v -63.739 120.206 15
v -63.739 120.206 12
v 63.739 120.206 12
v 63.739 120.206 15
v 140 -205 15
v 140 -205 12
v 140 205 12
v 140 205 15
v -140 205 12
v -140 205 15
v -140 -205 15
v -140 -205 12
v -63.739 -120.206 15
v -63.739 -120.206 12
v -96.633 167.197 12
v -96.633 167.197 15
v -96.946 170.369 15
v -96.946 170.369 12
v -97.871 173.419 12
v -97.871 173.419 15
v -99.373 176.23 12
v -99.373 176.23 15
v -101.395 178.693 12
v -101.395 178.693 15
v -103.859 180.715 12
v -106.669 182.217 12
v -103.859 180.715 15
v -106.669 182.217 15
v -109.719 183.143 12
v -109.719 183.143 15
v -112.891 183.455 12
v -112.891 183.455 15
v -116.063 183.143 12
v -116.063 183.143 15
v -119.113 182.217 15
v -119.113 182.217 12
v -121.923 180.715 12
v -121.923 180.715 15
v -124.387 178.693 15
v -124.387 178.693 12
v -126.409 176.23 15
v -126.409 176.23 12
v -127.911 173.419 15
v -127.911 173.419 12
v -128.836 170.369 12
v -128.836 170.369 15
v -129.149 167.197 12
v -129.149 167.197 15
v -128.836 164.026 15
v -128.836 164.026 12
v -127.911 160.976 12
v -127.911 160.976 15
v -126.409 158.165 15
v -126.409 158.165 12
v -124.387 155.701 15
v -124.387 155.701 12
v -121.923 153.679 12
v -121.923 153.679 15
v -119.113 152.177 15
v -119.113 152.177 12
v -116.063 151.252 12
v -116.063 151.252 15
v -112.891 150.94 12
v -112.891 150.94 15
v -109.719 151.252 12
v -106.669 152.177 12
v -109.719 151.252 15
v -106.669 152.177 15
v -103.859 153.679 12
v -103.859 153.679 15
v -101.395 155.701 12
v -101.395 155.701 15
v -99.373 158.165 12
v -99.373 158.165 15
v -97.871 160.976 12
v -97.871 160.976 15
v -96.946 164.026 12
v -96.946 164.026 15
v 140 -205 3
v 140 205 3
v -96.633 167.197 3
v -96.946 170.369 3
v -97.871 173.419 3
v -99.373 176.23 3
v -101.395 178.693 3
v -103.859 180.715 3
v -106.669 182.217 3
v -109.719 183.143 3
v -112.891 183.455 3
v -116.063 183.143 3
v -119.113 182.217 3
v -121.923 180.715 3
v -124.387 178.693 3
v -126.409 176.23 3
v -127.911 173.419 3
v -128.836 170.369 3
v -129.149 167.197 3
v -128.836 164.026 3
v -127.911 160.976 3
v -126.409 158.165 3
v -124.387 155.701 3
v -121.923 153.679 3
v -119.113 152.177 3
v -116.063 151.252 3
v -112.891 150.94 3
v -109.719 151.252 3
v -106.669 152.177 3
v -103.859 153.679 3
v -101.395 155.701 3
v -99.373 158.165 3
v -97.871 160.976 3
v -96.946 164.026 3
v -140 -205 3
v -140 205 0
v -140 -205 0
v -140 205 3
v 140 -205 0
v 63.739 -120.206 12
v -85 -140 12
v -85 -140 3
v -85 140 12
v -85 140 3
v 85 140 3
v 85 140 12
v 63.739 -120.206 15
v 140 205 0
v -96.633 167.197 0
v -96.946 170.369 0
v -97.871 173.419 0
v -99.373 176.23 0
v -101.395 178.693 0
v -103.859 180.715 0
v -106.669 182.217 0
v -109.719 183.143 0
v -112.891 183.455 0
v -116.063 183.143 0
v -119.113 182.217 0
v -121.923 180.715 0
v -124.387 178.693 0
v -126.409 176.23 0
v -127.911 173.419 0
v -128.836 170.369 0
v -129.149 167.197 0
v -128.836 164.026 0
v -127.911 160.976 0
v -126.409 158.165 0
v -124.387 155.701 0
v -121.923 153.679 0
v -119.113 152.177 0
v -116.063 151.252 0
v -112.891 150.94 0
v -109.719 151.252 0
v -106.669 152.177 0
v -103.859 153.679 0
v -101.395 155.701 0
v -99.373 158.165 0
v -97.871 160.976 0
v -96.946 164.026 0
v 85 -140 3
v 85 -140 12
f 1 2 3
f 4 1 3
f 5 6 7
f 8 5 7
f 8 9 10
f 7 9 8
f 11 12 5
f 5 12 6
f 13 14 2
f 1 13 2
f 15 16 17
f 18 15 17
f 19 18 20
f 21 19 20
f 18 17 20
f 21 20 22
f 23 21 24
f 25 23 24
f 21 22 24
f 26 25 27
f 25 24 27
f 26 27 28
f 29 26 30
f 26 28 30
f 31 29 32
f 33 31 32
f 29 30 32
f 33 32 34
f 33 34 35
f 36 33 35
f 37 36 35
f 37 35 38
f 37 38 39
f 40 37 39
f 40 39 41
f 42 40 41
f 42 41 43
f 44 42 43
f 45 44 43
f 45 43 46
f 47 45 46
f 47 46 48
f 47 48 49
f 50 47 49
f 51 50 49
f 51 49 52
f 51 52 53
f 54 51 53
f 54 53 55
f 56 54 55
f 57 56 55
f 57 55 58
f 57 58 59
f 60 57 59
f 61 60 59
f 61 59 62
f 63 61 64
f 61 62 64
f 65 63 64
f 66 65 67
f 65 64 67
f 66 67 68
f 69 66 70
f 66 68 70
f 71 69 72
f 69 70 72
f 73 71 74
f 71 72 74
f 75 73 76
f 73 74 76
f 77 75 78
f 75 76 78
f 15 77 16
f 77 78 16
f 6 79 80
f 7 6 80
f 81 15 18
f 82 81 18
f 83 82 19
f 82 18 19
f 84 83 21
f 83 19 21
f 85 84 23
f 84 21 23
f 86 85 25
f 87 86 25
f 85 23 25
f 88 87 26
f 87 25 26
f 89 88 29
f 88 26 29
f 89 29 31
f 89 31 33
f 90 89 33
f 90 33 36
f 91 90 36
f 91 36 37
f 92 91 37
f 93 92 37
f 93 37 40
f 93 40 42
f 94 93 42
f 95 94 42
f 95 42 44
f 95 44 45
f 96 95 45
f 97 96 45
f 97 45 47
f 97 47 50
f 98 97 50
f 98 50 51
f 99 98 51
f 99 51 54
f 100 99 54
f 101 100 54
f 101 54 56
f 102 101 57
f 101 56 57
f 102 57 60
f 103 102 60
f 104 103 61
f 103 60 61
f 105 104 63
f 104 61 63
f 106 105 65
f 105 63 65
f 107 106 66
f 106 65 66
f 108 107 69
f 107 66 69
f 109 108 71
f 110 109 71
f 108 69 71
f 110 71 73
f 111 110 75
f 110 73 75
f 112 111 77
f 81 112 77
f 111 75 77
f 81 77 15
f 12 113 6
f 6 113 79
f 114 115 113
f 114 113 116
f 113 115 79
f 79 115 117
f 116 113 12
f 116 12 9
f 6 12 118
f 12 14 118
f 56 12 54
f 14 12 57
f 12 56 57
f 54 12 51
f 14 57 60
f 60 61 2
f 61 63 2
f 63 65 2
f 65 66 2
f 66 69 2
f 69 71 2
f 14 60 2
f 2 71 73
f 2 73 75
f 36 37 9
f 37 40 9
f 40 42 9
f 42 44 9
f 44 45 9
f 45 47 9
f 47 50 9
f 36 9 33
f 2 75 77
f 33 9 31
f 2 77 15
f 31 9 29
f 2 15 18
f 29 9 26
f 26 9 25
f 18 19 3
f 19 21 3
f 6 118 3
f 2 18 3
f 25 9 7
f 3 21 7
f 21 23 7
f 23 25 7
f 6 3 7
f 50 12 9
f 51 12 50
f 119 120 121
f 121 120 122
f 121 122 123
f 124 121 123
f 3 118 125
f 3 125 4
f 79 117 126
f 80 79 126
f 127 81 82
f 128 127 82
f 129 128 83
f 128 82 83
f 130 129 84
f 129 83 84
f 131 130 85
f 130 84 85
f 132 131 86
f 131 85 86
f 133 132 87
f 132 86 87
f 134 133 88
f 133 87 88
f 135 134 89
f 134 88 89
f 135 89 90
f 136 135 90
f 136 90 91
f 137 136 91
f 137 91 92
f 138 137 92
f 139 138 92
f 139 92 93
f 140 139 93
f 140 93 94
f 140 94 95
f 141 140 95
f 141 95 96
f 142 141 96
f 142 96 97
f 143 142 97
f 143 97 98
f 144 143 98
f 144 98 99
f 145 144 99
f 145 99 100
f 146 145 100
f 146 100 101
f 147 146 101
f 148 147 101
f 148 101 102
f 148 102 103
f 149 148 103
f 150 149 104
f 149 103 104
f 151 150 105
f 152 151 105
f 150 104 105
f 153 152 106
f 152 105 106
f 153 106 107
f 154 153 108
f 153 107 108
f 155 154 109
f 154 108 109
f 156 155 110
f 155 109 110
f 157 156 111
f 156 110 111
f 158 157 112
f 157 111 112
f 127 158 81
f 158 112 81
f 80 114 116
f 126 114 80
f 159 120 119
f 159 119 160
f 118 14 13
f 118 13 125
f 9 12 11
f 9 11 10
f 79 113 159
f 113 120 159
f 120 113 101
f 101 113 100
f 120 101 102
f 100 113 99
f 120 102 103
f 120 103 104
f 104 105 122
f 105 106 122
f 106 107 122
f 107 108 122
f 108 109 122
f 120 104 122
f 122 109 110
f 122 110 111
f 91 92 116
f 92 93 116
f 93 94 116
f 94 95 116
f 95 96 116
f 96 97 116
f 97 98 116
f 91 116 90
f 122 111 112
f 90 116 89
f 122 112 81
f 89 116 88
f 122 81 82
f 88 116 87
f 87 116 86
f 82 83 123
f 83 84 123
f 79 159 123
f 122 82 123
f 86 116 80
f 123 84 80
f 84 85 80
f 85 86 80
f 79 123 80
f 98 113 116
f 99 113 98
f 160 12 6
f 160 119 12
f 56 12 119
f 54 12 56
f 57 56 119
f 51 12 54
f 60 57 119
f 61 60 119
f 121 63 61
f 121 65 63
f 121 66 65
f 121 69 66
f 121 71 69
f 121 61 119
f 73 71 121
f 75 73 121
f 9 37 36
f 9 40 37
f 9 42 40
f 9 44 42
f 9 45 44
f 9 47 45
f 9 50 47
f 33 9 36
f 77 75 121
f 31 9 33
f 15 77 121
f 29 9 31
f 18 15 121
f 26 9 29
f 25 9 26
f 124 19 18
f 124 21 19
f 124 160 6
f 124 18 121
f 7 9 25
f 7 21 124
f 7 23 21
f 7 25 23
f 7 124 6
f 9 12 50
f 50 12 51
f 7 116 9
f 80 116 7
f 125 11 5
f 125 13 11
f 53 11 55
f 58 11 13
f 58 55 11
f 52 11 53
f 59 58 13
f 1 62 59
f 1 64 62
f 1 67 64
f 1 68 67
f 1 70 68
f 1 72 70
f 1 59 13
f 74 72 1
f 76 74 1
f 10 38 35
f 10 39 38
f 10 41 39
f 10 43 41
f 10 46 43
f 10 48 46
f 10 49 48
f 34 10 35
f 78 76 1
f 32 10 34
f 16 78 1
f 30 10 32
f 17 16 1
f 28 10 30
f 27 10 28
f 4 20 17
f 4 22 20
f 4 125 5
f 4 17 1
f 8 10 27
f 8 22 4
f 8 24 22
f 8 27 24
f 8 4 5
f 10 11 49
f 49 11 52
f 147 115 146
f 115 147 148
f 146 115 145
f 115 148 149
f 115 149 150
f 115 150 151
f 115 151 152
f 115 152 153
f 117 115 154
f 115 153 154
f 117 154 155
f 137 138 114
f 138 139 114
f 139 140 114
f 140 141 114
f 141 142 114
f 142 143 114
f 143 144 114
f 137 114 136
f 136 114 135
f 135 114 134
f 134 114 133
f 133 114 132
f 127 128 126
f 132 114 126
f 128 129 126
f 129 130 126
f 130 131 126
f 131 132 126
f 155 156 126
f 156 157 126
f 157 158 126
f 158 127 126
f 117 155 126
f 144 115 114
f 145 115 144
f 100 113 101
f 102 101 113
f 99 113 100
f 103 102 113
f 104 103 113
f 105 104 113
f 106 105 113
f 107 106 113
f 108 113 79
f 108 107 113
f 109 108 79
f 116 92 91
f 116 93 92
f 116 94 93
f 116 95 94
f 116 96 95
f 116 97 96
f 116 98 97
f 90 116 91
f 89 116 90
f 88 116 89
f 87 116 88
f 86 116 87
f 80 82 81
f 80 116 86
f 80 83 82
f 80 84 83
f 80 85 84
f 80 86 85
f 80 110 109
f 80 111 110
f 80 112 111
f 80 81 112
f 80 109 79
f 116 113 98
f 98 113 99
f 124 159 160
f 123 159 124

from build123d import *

# Parameters (mm, degrees)
F0_W     = 280
F0_H     = 410
F1_DEPTH = 3
F2_W     = 280
F2_H     = 410
F2_W_2   = 170
F2_H_2   = 280
F3_DEPTH = 9
F4_W     = 280
F4_H     = 410
F4_W_2   = 127.478986
F4_H_2   = 240.411148
F5_DEPTH = 3
F6_R     = 16.25774
F7_DEPTH = 15.001


with BuildPart() as f1:
    # F0 (on Top) → F1 (new body)
    with BuildSketch(Plane.XY):
        Rectangle(F0_W, F0_H)
    extrude(amount=F1_DEPTH)


with BuildPart() as f3:
    # F2 (on face) → F3 (new body)
    with BuildSketch(Plane.XY.offset(3)):
        Rectangle(F2_W, F2_H)
        Rectangle(F2_W_2, F2_H_2, mode=Mode.SUBTRACT)
    extrude(amount=F3_DEPTH)


with BuildPart() as f5:
    # F4 (on face) → F5 (new body)
    with BuildSketch(Plane.XY.offset(12)):
        Rectangle(F4_W, F4_H)
        Rectangle(F4_W_2, F4_H_2, mode=Mode.SUBTRACT)
    extrude(amount=F5_DEPTH)


with BuildPart() as f7_tool:
    # F6 (on face) → F7 (new body, through all)
    with BuildSketch(Plane.XY.offset(15)):
        with Locations((-112.891056, 167.197257)):
            Circle(F6_R)
    extrude(amount=-F7_DEPTH)


with BuildPart() as f1_1:
    add(f1.part)

    # F7: cut by f7_tool
    add(f7_tool.part, mode=Mode.SUBTRACT)


with BuildPart() as f3_1:
    add(f3.part)

    # F7: cut by f7_tool
    add(f7_tool.part, mode=Mode.SUBTRACT)


with BuildPart() as f5_1:
    add(f5.part)

    # F7: cut by f7_tool
    add(f7_tool.part, mode=Mode.SUBTRACT)


solid = Compound([f1_1.part, f3_1.part, f5_1.part])
